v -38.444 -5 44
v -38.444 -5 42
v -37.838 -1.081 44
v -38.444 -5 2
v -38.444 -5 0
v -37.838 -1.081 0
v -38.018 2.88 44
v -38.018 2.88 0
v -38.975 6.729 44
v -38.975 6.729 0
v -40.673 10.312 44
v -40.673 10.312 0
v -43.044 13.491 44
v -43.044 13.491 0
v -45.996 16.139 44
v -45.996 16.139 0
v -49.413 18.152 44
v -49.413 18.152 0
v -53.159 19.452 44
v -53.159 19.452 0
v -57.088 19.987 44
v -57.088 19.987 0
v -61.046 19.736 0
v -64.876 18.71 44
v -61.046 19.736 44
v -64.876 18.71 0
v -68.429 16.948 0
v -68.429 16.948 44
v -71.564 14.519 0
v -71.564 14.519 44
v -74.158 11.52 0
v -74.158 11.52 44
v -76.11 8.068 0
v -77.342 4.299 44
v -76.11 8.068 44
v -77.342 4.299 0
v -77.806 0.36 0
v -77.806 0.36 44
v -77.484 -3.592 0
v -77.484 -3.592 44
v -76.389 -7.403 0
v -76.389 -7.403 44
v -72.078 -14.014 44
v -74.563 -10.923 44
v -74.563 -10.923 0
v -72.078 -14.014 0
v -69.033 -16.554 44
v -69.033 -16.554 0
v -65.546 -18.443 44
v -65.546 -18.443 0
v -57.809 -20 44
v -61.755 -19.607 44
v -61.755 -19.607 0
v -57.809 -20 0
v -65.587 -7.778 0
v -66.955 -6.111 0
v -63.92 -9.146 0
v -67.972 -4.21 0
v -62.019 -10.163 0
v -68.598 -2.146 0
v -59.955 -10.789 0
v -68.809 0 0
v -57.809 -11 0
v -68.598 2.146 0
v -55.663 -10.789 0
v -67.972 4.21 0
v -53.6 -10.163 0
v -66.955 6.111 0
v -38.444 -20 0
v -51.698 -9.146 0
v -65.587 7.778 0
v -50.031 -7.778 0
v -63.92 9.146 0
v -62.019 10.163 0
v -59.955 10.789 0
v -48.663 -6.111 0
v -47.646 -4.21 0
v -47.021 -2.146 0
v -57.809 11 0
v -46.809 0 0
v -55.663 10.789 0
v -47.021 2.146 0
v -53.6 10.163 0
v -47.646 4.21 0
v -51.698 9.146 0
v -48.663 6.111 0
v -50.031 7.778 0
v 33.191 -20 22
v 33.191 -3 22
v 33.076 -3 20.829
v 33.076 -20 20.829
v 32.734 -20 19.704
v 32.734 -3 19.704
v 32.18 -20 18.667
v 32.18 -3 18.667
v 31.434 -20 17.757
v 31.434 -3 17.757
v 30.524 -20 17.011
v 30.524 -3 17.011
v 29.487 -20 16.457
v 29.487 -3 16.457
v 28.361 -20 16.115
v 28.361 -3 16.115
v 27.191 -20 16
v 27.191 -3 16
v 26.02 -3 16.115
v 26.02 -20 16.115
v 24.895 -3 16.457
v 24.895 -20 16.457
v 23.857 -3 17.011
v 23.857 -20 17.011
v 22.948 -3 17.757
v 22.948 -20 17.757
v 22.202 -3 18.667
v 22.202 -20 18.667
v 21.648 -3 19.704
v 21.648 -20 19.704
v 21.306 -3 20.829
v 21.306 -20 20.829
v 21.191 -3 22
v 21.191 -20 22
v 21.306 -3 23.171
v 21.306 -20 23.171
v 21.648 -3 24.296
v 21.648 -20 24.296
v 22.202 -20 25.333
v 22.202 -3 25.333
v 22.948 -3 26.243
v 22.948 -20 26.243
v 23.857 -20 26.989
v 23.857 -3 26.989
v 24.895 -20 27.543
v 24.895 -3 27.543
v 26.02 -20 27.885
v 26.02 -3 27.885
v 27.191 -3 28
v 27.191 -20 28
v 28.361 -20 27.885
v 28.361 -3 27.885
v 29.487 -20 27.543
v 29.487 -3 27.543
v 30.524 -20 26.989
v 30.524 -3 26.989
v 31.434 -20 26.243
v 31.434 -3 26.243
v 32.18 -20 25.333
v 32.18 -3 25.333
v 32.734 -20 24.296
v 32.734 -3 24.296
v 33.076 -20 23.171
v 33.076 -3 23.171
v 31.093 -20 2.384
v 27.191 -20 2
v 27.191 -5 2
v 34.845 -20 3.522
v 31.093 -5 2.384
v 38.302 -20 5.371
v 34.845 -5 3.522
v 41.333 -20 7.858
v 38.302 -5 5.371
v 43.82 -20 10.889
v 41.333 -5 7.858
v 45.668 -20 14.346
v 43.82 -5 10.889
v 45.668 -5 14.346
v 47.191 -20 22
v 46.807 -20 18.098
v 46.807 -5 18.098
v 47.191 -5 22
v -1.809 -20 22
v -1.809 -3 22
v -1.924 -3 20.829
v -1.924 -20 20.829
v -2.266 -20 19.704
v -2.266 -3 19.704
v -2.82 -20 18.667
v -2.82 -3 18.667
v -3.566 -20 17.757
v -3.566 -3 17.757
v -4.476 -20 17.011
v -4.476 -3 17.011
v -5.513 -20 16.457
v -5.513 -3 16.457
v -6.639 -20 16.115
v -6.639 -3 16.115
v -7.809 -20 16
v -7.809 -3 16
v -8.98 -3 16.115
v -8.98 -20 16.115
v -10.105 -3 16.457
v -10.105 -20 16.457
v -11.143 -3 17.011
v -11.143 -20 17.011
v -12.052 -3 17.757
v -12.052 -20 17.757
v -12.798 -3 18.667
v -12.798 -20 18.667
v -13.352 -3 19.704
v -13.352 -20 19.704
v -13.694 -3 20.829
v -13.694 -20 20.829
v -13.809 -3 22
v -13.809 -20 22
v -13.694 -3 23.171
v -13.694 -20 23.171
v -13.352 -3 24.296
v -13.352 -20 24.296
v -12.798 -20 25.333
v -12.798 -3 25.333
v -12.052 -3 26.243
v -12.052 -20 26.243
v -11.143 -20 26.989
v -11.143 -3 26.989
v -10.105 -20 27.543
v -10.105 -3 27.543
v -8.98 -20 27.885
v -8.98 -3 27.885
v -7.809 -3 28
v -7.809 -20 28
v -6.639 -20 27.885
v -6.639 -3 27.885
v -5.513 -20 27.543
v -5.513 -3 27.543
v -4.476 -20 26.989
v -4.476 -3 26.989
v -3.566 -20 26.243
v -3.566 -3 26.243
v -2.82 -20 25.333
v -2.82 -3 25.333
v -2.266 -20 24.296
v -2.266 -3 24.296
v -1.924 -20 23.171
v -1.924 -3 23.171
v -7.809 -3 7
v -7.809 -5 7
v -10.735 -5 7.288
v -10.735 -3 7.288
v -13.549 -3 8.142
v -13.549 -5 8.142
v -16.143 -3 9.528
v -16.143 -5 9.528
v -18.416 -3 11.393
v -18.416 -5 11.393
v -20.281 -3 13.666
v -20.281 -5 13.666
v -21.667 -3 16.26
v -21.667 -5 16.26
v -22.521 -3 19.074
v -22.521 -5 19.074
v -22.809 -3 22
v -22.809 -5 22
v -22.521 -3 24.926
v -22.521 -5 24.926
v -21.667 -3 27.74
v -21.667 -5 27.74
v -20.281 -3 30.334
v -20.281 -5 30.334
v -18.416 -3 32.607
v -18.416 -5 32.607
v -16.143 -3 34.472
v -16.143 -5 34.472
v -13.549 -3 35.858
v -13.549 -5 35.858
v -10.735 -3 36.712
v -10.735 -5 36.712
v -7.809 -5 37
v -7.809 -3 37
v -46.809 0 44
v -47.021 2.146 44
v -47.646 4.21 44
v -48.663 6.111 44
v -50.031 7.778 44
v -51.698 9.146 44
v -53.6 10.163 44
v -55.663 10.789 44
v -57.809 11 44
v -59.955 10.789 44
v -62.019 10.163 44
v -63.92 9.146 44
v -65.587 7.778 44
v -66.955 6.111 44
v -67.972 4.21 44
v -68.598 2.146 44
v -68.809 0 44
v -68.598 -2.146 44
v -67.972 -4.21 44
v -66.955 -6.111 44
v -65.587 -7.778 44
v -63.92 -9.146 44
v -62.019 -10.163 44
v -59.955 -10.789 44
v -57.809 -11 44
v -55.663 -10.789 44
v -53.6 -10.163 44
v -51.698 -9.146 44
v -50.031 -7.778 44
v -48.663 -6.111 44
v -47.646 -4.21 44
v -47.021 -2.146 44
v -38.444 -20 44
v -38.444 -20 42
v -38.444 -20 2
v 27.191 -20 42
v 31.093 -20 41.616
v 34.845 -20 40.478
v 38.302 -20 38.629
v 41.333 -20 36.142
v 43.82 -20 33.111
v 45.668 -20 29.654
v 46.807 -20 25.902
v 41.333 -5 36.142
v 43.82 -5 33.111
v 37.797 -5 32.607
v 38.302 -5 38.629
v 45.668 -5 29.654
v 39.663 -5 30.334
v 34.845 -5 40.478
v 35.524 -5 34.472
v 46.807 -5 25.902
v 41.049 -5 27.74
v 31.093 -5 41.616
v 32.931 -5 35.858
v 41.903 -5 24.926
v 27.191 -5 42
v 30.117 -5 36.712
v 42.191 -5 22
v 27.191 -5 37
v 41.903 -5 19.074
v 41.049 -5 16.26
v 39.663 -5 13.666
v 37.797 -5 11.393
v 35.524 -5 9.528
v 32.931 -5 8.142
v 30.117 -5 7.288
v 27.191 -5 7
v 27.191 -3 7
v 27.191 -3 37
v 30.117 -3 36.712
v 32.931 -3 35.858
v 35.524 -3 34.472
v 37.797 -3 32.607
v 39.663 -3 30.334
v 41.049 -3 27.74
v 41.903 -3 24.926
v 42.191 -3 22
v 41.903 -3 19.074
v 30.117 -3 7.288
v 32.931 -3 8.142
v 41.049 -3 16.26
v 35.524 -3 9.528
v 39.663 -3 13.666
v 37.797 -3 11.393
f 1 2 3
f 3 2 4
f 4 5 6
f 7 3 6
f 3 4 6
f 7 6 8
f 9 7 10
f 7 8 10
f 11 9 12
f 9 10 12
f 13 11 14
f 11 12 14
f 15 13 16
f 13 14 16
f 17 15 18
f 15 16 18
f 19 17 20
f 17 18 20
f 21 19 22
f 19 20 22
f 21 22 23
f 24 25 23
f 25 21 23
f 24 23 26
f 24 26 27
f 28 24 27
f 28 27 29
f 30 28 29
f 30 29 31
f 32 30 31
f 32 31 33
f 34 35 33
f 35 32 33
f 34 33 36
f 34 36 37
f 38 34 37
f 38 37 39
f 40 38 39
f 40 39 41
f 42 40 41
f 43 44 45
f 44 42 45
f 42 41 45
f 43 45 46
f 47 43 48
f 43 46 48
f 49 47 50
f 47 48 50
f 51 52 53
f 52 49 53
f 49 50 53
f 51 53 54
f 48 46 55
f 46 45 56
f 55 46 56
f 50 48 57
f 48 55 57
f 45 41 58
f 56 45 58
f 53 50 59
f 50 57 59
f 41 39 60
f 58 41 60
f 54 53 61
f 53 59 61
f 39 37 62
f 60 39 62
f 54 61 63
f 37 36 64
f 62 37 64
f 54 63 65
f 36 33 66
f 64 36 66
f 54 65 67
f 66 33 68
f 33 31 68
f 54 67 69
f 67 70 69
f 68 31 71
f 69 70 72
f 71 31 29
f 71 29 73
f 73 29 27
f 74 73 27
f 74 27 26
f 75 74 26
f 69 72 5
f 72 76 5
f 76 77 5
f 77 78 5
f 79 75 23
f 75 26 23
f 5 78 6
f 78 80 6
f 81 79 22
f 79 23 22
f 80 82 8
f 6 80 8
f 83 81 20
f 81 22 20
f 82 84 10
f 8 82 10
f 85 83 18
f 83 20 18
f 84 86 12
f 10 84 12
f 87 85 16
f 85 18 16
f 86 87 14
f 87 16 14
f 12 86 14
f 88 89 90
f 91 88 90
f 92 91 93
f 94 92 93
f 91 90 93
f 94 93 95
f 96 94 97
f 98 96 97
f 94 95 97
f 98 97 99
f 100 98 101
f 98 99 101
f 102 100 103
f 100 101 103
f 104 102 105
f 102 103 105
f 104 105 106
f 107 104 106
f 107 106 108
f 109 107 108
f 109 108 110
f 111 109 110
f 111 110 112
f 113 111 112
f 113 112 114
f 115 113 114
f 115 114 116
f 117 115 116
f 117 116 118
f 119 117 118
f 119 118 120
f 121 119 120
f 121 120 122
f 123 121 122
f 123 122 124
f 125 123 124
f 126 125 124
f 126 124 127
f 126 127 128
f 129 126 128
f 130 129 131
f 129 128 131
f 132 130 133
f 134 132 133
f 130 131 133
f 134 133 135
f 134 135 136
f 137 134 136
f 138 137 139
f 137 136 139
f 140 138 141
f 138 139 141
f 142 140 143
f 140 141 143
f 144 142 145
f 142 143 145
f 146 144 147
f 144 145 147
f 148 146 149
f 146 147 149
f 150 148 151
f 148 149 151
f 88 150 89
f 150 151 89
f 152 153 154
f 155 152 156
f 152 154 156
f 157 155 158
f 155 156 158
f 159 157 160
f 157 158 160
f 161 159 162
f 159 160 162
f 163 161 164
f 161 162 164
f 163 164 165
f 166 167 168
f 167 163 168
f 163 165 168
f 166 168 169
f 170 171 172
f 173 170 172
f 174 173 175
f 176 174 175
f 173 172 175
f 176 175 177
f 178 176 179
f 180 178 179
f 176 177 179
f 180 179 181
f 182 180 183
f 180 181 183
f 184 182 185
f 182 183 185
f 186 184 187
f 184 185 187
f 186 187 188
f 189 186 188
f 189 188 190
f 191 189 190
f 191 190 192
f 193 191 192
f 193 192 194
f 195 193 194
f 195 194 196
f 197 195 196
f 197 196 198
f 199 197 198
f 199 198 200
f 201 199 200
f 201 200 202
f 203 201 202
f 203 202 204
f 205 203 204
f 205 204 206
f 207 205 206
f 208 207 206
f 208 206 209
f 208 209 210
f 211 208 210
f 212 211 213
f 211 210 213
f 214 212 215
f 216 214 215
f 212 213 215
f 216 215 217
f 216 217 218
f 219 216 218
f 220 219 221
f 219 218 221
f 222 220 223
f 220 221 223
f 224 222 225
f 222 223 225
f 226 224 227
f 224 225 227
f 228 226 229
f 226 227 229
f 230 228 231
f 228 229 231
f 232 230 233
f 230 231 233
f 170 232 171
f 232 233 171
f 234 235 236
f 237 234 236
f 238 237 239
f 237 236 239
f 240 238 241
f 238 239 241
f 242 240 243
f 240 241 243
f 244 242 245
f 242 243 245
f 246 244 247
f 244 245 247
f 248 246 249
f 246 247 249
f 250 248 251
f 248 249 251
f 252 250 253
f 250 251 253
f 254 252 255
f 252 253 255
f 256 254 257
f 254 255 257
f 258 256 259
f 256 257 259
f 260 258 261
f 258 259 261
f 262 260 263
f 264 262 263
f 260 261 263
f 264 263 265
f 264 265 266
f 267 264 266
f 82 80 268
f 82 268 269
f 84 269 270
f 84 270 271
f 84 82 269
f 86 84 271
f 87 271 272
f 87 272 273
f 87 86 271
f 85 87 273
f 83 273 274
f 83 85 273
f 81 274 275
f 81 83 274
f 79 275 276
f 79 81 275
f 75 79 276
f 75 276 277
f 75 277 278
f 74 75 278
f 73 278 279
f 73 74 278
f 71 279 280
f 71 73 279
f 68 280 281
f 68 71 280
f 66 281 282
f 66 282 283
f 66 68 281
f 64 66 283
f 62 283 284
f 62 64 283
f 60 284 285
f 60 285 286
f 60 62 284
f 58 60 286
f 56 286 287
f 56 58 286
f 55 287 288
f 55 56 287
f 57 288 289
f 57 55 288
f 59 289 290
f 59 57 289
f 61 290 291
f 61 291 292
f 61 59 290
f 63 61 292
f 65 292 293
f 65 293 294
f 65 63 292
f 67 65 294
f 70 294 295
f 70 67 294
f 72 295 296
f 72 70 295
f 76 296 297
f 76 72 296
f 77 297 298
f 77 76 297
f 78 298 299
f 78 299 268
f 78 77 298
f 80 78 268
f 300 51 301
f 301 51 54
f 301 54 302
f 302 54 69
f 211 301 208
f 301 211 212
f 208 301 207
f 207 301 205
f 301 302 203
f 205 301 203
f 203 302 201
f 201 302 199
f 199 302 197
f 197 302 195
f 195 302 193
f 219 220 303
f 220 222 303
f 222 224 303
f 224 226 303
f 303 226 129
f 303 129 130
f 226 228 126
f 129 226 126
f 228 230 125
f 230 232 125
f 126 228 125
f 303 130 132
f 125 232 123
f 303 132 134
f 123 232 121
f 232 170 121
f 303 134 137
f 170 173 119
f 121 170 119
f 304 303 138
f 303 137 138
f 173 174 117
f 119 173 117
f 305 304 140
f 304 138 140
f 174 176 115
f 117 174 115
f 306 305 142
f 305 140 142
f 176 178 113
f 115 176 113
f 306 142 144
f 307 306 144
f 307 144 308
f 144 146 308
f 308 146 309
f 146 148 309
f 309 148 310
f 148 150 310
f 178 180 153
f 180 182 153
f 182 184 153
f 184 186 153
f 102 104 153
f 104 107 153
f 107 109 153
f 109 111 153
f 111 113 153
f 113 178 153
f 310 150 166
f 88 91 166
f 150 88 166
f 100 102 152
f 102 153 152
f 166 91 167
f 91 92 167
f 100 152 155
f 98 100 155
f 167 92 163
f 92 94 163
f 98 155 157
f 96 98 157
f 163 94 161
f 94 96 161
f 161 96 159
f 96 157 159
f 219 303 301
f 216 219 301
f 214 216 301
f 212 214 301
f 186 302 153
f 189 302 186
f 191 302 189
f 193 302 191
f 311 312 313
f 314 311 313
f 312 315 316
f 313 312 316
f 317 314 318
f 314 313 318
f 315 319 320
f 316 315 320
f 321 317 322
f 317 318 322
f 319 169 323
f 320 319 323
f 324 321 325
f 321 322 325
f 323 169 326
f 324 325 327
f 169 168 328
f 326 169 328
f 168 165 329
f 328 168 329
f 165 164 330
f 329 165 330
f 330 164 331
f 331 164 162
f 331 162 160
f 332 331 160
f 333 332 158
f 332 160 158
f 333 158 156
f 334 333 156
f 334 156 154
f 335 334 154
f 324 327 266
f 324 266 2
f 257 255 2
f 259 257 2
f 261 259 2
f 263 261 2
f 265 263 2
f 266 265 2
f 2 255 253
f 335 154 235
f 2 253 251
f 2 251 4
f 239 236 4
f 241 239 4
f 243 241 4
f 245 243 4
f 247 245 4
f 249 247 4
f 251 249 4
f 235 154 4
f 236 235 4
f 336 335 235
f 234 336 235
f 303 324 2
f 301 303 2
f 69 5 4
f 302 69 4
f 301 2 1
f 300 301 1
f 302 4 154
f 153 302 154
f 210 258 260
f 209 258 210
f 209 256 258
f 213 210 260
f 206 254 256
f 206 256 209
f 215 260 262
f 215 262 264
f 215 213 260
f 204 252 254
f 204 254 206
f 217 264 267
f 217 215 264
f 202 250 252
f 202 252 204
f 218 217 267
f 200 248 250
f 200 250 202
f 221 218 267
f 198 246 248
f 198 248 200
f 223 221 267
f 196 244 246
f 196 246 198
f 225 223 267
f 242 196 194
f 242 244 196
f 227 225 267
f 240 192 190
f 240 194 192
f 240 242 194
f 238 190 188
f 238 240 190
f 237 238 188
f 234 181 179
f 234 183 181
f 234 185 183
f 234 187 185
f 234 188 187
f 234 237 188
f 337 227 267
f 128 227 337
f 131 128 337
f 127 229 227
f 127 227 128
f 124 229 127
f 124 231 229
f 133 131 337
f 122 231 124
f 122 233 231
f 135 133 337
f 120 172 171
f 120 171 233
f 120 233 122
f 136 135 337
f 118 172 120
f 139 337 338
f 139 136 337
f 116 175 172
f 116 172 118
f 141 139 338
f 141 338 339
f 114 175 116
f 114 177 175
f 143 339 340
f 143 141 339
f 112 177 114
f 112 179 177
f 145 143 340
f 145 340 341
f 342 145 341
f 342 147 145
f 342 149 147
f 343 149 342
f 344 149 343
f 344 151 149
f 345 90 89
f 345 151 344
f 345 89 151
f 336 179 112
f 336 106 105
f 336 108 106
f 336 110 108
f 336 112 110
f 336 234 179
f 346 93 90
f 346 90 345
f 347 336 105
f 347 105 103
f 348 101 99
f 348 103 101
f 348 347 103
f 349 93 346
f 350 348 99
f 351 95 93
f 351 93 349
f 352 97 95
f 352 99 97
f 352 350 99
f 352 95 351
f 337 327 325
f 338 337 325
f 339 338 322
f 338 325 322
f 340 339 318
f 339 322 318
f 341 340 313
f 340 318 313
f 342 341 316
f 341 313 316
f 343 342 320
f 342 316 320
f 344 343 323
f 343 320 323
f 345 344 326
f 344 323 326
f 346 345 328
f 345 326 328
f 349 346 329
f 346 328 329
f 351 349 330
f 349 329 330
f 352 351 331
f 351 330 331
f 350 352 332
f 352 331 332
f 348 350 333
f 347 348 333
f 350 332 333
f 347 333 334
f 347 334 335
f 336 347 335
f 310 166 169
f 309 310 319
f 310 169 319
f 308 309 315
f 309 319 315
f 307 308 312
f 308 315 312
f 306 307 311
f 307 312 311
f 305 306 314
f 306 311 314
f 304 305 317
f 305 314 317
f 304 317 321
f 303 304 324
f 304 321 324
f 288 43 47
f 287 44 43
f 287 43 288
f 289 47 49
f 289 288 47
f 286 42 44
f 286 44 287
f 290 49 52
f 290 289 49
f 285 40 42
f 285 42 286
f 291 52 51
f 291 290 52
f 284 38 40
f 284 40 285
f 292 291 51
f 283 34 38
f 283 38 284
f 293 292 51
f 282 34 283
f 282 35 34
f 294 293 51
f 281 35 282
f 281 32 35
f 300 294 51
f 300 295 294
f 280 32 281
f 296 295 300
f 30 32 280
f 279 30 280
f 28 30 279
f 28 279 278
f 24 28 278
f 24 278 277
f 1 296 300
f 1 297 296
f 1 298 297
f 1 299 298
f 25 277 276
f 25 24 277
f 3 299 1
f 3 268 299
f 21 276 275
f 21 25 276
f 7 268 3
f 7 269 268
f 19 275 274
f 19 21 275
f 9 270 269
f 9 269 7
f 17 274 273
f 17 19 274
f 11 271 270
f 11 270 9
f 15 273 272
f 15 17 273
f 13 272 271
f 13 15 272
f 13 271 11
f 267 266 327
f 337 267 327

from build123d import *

# Parameters (mm, degrees)
SKETCH1_R           = 11
BOSS_EXTRUDE1_DEPTH = 44
BOSS_EXTRUDE2_DEPTH = 44
CUT_EXTRUDE1_DEPTH  = 44
BOSS_EXTRUDE3_DEPTH = 2
SKETCH4_R           = 6
CUT_EXTRUDE2_DEPTH  = 44


with BuildPart() as part:
    # Sketch1 → Boss-Extrude1 (new body)
    with BuildSketch(Plane.XY):
        with BuildLine():
            ThreePointArc((-37.809139785, 0), (-71.951275409, 14.142135624), (-57.809139785, -20))
            ThreePointArc((-57.809139785, -20), (-45.561691071, -15.811388301), (-38.444223054, -5))
            ThreePointArc((-38.444223054, -5), (-37.96854586, -2.52008585), (-37.809139785, 0))
        make_face()
        with Locations((-57.809139785, 0)):
            Circle(SKETCH1_R, mode=Mode.SUBTRACT)
    extrude(amount=BOSS_EXTRUDE1_DEPTH)

    # Sketch1<5> → Boss-Extrude2 (add)
    with BuildSketch(Plane.XY):
        with BuildLine():
            ThreePointArc((-38.444223054, -5), (-45.561691071, -15.811388301), (-57.809139785, -20))
            Line((-57.809139785, -20), (47.190860215, -20))
            Line((47.190860215, -20), (47.190860215, -5))
            Line((47.190860215, -5), (-38.444223054, -5))
        make_face()
    extrude(amount=BOSS_EXTRUDE2_DEPTH)

    # Sketch2 → Cut-Extrude1 (cut)
    with BuildSketch(Plane(origin=(0, -5, 0), x_dir=(1, 0, 0), z_dir=(0, 1, 0))):
        with BuildLine():
            Line((47.190860215, 0), (-38.444223054, 0))
            Line((-38.444223054, 0), (-38.444223054, -2))
            Line((-38.444223054, -2), (27.190860215, -2))
            ThreePointArc((27.190860215, -2), (41.332995839, -7.857864376), (47.190860215, -22))
            Line((47.190860215, -22), (47.190860215, 0))
        make_face()
        with BuildLine():
            Line((27.190860215, -42), (-38.444223054, -42))
            Line((-38.444223054, -42), (-38.444223054, -44))
            Line((-38.444223054, -44), (47.190860215, -44))
            Line((47.190860215, -44), (47.190860215, -22))
            ThreePointArc((47.190860215, -22), (41.332995839, -36.142135624), (27.190860215, -42))
        make_face()
    extrude(amount=-CUT_EXTRUDE1_DEPTH, mode=Mode.SUBTRACT)

    # Sketch3 → Boss-Extrude3 (add)
    with BuildSketch(Plane(origin=(0, -5, 0), x_dir=(1, 0, 0), z_dir=(0, 1, 0))):
        with BuildLine():
            Line((-7.809139785, -37), (27.190860215, -37))
            ThreePointArc((27.190860215, -37), (42.190860215, -22), (27.190860215, -7))
            Line((27.190860215, -7), (-7.809139785, -7))
            ThreePointArc((-7.809139785, -7), (-22.809139785, -22), (-7.809139785, -37))
        make_face()
    extrude(amount=BOSS_EXTRUDE3_DEPTH)

    # Sketch4 → Cut-Extrude2 (cut)
    with BuildSketch(Plane(origin=(0, -3, 0), x_dir=(1, 0, 0), z_dir=(0, 1, 0))):
        with Locations((27.190860215, -22)):
            Circle(SKETCH4_R)
        with Locations((-7.809139785, -22)):
            Circle(SKETCH4_R)
    extrude(amount=-CUT_EXTRUDE2_DEPTH, mode=Mode.SUBTRACT)


solid = part.part
